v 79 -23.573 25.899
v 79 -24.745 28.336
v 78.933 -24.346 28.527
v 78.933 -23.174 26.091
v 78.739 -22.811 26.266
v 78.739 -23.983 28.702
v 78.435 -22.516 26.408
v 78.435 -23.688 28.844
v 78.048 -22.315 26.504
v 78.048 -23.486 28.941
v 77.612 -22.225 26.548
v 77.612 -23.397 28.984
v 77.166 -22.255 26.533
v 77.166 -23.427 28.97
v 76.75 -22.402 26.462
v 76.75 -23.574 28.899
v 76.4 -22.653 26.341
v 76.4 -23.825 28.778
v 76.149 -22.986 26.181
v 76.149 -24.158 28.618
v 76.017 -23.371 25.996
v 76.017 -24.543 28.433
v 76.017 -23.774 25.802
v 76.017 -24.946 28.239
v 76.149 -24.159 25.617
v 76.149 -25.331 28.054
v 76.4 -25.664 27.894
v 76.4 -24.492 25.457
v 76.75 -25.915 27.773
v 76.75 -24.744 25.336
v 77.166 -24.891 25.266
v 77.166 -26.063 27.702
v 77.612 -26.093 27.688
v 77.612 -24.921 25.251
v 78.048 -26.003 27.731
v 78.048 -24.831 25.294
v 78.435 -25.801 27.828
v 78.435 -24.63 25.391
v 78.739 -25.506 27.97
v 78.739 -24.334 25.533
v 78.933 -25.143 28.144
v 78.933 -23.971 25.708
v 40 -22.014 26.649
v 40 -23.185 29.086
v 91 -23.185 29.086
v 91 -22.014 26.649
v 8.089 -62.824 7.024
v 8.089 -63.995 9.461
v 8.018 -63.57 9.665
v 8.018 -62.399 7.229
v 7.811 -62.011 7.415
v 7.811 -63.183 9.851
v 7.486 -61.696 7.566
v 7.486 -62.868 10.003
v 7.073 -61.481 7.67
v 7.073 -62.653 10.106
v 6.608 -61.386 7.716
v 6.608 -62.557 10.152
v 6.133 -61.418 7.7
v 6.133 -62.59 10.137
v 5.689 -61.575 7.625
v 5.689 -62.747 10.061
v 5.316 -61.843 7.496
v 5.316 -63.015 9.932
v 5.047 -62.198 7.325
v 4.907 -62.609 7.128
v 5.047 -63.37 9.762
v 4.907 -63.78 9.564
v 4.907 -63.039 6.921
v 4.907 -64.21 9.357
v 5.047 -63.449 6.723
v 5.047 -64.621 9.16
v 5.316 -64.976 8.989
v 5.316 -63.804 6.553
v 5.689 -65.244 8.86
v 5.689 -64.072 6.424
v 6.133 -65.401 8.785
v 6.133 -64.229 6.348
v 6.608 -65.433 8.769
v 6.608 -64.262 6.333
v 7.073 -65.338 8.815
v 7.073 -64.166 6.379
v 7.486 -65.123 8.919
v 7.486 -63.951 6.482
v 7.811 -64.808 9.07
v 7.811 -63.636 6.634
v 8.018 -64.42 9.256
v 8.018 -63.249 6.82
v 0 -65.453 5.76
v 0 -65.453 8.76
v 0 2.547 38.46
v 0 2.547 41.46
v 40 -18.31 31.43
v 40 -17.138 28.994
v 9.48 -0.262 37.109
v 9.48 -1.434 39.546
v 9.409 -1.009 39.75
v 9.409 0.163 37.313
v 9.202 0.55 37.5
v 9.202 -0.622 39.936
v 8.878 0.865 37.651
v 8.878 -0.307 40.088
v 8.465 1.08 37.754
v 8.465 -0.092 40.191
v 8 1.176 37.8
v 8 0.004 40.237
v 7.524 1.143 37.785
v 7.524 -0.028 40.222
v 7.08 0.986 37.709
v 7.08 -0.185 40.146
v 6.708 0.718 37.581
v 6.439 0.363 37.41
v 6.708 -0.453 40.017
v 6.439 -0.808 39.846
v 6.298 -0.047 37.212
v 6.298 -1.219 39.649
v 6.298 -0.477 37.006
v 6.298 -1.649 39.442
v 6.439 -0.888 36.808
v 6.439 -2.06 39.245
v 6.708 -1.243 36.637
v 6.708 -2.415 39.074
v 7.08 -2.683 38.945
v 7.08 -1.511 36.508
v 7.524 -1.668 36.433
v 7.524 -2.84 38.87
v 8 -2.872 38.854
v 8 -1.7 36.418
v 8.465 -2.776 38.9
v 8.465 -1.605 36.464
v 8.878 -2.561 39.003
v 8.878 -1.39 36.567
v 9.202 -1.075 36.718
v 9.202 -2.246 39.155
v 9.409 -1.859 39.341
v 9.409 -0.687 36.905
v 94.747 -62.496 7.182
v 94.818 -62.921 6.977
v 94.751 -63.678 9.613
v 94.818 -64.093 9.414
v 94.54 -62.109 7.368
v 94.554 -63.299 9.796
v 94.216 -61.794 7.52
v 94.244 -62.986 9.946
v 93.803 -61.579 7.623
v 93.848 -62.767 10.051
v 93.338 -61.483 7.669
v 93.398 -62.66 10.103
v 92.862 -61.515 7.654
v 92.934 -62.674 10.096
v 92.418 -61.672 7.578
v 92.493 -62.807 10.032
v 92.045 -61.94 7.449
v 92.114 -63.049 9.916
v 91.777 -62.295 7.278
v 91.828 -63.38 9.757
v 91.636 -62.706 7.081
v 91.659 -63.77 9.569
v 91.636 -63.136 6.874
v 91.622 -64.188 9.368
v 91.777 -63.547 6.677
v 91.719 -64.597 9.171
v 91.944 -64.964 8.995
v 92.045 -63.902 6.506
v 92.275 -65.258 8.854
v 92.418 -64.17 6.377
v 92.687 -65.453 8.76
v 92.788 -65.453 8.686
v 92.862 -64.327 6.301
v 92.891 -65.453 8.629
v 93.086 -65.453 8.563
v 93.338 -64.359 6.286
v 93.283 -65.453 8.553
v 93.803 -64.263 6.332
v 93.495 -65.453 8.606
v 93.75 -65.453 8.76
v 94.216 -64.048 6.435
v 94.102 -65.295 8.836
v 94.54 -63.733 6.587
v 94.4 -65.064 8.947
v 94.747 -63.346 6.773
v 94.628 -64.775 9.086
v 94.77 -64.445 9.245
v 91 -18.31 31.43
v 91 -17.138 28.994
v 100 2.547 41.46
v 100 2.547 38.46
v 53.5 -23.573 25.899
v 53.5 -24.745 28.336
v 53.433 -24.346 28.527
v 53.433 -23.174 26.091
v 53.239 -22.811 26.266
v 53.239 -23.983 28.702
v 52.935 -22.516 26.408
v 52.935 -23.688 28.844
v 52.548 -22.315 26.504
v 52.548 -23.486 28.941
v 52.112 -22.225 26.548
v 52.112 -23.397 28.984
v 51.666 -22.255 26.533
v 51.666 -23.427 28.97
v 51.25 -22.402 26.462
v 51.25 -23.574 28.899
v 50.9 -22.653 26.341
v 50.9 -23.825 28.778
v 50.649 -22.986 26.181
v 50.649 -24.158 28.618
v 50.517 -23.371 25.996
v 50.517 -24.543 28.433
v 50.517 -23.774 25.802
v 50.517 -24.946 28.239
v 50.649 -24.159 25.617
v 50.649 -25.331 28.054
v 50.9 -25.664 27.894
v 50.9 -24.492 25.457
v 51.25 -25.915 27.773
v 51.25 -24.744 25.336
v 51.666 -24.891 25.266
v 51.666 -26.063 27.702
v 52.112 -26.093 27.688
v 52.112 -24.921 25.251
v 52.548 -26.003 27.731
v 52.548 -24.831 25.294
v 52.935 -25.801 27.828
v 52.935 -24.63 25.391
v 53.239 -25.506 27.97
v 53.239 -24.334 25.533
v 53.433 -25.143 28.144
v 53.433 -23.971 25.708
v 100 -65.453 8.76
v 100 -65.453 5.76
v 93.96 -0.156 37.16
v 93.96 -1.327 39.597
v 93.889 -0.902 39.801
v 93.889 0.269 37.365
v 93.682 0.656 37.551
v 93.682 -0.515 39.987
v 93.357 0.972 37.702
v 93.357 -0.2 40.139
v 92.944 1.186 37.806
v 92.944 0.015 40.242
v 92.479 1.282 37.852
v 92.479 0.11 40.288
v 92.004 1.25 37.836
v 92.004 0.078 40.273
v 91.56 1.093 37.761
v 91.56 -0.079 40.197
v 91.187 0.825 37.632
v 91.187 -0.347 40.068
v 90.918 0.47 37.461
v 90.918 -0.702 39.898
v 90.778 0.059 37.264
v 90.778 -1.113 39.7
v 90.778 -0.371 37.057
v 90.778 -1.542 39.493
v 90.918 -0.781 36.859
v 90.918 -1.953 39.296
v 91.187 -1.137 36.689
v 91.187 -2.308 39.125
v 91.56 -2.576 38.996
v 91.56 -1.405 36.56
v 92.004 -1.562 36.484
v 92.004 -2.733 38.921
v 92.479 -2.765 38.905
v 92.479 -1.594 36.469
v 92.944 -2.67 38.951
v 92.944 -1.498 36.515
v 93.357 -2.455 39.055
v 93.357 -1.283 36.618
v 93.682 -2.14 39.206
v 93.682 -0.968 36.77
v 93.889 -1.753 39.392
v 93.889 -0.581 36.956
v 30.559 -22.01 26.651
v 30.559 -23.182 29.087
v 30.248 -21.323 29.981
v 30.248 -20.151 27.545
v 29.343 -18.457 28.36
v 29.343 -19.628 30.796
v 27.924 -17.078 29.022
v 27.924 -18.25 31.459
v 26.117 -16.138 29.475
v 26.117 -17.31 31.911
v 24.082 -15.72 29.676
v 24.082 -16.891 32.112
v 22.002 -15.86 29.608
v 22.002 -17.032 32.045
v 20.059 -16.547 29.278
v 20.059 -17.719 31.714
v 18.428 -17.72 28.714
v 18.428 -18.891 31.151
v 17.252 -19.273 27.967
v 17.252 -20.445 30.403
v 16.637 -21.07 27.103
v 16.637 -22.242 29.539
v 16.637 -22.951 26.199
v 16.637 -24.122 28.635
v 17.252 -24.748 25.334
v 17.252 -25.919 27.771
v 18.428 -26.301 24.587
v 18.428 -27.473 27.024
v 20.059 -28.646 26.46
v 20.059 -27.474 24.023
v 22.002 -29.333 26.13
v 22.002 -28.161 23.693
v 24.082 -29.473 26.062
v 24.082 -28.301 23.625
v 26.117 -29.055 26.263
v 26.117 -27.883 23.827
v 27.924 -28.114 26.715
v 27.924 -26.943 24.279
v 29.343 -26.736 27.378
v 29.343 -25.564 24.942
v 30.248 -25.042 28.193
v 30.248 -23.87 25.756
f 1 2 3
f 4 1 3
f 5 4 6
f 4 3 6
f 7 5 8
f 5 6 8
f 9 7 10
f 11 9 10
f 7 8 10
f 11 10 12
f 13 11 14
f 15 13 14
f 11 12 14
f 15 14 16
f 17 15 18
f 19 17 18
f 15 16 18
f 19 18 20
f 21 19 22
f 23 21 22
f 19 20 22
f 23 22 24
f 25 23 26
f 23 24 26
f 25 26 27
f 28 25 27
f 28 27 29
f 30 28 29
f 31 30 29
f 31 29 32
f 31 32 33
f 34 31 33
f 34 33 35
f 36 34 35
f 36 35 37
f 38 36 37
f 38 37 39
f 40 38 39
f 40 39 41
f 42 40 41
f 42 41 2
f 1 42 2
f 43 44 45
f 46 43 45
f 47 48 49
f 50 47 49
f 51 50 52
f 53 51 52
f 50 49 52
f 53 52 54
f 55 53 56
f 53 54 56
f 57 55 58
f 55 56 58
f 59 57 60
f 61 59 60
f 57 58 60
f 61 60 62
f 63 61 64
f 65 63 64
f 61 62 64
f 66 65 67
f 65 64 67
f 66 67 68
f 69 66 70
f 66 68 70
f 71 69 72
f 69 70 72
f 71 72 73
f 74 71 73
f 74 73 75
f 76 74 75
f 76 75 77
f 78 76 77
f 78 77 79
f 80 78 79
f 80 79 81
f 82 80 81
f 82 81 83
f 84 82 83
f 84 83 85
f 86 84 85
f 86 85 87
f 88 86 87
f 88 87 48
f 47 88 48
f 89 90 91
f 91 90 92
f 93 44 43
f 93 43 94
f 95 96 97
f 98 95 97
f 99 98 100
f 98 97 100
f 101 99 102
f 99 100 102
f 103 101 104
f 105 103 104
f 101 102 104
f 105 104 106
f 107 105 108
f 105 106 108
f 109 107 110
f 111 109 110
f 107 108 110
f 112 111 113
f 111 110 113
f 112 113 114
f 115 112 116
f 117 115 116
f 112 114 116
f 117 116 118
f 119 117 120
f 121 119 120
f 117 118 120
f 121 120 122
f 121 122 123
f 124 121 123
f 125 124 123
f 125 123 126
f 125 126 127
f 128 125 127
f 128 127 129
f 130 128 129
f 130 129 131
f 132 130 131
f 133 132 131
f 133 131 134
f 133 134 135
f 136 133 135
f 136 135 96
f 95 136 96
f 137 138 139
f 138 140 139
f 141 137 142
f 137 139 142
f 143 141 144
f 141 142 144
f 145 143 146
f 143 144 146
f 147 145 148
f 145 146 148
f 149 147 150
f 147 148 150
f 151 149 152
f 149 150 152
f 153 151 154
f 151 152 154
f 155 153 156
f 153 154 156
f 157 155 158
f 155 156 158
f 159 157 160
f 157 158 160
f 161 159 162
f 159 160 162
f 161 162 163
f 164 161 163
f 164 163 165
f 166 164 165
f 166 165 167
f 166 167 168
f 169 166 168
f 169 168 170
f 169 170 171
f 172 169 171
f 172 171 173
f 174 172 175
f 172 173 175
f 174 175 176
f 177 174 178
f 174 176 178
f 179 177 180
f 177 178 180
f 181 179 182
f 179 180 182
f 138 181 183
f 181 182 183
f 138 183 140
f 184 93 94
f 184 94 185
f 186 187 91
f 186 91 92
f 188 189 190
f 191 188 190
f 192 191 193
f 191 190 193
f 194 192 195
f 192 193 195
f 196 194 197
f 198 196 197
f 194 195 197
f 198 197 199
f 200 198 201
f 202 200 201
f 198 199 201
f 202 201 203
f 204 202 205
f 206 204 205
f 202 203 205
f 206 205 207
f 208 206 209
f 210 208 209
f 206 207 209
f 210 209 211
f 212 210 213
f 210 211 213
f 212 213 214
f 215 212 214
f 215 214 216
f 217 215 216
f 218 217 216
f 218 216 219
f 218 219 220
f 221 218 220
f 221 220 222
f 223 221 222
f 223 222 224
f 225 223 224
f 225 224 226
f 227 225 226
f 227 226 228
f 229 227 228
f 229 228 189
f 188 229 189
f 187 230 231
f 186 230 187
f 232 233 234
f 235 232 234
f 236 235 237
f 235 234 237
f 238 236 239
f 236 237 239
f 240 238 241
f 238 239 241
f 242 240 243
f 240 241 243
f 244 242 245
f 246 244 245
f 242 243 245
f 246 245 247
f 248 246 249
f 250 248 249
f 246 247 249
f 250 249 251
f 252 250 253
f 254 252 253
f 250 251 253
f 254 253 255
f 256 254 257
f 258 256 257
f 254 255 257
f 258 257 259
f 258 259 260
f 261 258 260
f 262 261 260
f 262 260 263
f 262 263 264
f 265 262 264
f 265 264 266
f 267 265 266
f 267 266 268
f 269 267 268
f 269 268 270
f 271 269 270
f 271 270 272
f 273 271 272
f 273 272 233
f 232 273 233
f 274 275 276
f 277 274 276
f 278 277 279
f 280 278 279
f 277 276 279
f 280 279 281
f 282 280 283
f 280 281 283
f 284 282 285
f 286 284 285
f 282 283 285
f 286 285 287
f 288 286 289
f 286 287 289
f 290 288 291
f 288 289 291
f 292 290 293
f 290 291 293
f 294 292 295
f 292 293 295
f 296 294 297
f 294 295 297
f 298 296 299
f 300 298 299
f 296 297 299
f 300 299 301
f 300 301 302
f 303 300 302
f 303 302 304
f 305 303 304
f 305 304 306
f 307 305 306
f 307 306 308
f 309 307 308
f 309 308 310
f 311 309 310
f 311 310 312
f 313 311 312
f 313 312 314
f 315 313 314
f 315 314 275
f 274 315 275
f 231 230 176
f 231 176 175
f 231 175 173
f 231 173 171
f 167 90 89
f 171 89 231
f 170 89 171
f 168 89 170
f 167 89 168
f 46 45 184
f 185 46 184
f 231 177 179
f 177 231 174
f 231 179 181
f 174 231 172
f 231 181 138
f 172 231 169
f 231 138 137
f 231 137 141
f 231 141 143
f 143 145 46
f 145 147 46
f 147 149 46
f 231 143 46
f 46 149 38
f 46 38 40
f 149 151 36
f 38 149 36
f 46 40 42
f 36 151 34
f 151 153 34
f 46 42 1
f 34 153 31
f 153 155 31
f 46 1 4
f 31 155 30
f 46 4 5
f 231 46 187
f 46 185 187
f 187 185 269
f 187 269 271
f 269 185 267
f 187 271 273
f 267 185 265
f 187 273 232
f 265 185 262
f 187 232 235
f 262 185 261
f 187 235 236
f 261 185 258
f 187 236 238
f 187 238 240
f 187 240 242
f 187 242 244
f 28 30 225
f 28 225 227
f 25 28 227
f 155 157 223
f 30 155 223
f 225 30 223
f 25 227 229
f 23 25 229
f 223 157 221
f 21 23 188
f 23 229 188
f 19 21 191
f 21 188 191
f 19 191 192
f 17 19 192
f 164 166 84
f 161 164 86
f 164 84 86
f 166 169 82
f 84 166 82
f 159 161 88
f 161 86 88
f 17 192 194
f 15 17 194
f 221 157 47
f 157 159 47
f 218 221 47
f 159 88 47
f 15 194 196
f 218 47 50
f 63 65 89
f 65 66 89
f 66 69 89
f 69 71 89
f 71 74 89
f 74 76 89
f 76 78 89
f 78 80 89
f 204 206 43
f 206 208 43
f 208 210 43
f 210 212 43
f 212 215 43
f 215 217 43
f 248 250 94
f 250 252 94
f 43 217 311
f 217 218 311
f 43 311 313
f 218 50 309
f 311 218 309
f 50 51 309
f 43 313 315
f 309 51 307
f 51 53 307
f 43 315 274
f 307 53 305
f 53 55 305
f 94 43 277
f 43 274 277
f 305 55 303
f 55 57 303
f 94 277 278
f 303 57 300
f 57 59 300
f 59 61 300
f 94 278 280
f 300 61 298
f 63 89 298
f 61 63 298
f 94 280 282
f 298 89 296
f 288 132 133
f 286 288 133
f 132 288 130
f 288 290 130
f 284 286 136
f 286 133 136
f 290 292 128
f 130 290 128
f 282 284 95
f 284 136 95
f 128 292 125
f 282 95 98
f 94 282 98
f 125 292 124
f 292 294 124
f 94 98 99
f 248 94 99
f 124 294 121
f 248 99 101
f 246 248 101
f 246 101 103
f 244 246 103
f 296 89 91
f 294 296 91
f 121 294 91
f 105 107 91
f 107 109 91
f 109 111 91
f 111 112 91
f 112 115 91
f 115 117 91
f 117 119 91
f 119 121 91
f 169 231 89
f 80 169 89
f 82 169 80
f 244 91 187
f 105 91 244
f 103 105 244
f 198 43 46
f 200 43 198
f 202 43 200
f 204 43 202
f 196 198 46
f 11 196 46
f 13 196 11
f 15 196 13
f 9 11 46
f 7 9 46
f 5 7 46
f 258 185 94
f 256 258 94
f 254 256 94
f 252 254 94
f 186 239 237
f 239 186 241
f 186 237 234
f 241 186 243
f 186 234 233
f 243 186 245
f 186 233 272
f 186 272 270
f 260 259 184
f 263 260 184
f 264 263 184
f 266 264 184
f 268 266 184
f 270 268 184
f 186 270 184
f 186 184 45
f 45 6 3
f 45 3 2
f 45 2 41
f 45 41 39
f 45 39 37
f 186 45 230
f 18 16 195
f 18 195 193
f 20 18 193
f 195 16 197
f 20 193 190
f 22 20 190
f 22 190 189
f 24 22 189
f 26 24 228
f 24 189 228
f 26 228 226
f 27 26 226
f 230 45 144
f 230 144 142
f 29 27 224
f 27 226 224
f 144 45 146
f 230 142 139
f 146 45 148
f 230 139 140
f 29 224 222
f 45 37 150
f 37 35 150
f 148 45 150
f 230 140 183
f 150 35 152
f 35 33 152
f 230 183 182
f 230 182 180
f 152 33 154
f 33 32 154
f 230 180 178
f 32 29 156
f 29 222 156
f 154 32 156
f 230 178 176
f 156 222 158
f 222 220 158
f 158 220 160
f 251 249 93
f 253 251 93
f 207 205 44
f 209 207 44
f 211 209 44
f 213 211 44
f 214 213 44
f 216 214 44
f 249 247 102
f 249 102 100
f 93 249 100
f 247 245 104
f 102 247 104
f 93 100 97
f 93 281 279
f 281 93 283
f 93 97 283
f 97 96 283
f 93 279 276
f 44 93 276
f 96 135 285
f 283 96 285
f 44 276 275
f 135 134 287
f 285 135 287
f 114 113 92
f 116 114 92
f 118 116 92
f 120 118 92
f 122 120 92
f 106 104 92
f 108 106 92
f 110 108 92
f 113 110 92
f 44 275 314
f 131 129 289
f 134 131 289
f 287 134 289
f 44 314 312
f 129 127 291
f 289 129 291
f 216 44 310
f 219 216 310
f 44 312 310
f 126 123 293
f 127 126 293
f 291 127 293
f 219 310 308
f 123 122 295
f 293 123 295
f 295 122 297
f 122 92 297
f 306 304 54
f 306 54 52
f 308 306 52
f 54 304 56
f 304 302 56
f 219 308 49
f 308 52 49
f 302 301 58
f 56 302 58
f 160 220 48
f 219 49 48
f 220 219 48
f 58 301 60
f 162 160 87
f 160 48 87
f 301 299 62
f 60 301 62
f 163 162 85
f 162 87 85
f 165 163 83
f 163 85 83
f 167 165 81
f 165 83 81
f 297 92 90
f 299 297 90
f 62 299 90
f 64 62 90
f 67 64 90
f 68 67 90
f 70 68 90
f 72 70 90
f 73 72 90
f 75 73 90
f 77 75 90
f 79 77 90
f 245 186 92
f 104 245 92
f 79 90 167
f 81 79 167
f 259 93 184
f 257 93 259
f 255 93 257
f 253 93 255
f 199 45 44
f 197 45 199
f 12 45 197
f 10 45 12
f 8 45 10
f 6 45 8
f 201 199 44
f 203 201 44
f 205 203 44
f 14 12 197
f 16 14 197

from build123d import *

# Parameters (mm, degrees)
SKETCH009_AS_DRAWN_R                      = 1.5
SKETCH009_AS_DRAWN_W                      = 51
SKETCH009_AS_DRAWN_H                      = 5.41
EXTRUDE010_DEPTH                          = 5
EXTRUDE010_ONTO_SKETCH009_PLACEMENT_ANGLE = 25.682094
SKETCH008_AS_DRAWN_R                      = 7
EXTRUDE009_DEPTH                          = 30
EXTRUDE009_ONTO_SKETCH008_PLACEMENT_ANGLE = 25.682094
SKETCH007_AS_DRAWN_R                      = 1.6
EXTRUDE008_DEPTH                          = 5
EXTRUDE008_ONTO_SKETCH007_PLACEMENT_ANGLE = 25.682094
EXTRUDE007_DEPTH                          = 100


with BuildPart() as extrude010:
    # Sketch009 as drawn → Extrude010 (new, symmetric)
    with BuildSketch(Plane.XY):
        with Locations((52, -10.02)):
            Circle(SKETCH009_AS_DRAWN_R)
        with Locations((77.5, -10.02)):
            Circle(SKETCH009_AS_DRAWN_R)
        with Locations((65.5, -5.585)):
            Rectangle(SKETCH009_AS_DRAWN_W, SKETCH009_AS_DRAWN_H)
    extrude(amount=EXTRUDE010_DEPTH, both=True)


with BuildPart() as extrude010_1:
    # Extrude010 onto Sketch009 placement: moved
    add(extrude010.part.moved(Location((0, -15.714438, 32.678321))).rotate(Axis((0, -15.714438, 32.678321), (1, 0, 0)), EXTRUDE010_ONTO_SKETCH009_PLACEMENT_ANGLE))


with BuildPart() as extrude009:
    # Sketch008 as drawn → Extrude009 (new)
    with BuildSketch(Plane.XY):
        with Locations((23.559155, -8.28634)):
            Circle(SKETCH008_AS_DRAWN_R)
    extrude(amount=-EXTRUDE009_DEPTH)


with BuildPart() as extrude009_1:
    # Extrude009 onto Sketch008 placement: moved
    add(extrude009.part.moved(Location((0, -15.714438, 32.678321))).rotate(Axis((0, -15.714438, 32.678321), (1, 0, 0)), EXTRUDE009_ONTO_SKETCH008_PLACEMENT_ANGLE))


with BuildPart() as extrude008:
    # Sketch007 as drawn → Extrude008 (new, symmetric)
    with BuildSketch(Plane.XY):
        with Locations((92.35981, 15.963995)):
            Circle(SKETCH007_AS_DRAWN_R)
        with Locations((7.880468, 15.845796)):
            Circle(SKETCH007_AS_DRAWN_R)
        with Locations((6.488905, -53.57334)):
            Circle(SKETCH007_AS_DRAWN_R)
        with Locations((93.218208, -53.681344)):
            Circle(SKETCH007_AS_DRAWN_R)
    extrude(amount=EXTRUDE008_DEPTH, both=True)


with BuildPart() as extrude008_1:
    # Extrude008 onto Sketch007 placement: moved
    add(extrude008.part.moved(Location((0, -15.714438, 32.678321))).rotate(Axis((0, -15.714438, 32.678321), (1, 0, 0)), EXTRUDE008_ONTO_SKETCH007_PLACEMENT_ANGLE))


with BuildPart() as tapa:
    # Sketch006 → Extrude007 (new body)
    with BuildSketch(Plane.YZ):
        Polygon((-65.452812, 5.76), (2.547146, 38.46), (2.547146, 41.46), (-65.452812, 8.76), align=None)
    extrude(amount=EXTRUDE007_DEPTH)

    # Cut004: cut Extrude008
    add(extrude008_1.part, mode=Mode.SUBTRACT)

    # Cut005: cut Extrude009
    add(extrude009_1.part, mode=Mode.SUBTRACT)

    # Cut006: cut Extrude010
    add(extrude010_1.part, mode=Mode.SUBTRACT)


solid = tapa.part
